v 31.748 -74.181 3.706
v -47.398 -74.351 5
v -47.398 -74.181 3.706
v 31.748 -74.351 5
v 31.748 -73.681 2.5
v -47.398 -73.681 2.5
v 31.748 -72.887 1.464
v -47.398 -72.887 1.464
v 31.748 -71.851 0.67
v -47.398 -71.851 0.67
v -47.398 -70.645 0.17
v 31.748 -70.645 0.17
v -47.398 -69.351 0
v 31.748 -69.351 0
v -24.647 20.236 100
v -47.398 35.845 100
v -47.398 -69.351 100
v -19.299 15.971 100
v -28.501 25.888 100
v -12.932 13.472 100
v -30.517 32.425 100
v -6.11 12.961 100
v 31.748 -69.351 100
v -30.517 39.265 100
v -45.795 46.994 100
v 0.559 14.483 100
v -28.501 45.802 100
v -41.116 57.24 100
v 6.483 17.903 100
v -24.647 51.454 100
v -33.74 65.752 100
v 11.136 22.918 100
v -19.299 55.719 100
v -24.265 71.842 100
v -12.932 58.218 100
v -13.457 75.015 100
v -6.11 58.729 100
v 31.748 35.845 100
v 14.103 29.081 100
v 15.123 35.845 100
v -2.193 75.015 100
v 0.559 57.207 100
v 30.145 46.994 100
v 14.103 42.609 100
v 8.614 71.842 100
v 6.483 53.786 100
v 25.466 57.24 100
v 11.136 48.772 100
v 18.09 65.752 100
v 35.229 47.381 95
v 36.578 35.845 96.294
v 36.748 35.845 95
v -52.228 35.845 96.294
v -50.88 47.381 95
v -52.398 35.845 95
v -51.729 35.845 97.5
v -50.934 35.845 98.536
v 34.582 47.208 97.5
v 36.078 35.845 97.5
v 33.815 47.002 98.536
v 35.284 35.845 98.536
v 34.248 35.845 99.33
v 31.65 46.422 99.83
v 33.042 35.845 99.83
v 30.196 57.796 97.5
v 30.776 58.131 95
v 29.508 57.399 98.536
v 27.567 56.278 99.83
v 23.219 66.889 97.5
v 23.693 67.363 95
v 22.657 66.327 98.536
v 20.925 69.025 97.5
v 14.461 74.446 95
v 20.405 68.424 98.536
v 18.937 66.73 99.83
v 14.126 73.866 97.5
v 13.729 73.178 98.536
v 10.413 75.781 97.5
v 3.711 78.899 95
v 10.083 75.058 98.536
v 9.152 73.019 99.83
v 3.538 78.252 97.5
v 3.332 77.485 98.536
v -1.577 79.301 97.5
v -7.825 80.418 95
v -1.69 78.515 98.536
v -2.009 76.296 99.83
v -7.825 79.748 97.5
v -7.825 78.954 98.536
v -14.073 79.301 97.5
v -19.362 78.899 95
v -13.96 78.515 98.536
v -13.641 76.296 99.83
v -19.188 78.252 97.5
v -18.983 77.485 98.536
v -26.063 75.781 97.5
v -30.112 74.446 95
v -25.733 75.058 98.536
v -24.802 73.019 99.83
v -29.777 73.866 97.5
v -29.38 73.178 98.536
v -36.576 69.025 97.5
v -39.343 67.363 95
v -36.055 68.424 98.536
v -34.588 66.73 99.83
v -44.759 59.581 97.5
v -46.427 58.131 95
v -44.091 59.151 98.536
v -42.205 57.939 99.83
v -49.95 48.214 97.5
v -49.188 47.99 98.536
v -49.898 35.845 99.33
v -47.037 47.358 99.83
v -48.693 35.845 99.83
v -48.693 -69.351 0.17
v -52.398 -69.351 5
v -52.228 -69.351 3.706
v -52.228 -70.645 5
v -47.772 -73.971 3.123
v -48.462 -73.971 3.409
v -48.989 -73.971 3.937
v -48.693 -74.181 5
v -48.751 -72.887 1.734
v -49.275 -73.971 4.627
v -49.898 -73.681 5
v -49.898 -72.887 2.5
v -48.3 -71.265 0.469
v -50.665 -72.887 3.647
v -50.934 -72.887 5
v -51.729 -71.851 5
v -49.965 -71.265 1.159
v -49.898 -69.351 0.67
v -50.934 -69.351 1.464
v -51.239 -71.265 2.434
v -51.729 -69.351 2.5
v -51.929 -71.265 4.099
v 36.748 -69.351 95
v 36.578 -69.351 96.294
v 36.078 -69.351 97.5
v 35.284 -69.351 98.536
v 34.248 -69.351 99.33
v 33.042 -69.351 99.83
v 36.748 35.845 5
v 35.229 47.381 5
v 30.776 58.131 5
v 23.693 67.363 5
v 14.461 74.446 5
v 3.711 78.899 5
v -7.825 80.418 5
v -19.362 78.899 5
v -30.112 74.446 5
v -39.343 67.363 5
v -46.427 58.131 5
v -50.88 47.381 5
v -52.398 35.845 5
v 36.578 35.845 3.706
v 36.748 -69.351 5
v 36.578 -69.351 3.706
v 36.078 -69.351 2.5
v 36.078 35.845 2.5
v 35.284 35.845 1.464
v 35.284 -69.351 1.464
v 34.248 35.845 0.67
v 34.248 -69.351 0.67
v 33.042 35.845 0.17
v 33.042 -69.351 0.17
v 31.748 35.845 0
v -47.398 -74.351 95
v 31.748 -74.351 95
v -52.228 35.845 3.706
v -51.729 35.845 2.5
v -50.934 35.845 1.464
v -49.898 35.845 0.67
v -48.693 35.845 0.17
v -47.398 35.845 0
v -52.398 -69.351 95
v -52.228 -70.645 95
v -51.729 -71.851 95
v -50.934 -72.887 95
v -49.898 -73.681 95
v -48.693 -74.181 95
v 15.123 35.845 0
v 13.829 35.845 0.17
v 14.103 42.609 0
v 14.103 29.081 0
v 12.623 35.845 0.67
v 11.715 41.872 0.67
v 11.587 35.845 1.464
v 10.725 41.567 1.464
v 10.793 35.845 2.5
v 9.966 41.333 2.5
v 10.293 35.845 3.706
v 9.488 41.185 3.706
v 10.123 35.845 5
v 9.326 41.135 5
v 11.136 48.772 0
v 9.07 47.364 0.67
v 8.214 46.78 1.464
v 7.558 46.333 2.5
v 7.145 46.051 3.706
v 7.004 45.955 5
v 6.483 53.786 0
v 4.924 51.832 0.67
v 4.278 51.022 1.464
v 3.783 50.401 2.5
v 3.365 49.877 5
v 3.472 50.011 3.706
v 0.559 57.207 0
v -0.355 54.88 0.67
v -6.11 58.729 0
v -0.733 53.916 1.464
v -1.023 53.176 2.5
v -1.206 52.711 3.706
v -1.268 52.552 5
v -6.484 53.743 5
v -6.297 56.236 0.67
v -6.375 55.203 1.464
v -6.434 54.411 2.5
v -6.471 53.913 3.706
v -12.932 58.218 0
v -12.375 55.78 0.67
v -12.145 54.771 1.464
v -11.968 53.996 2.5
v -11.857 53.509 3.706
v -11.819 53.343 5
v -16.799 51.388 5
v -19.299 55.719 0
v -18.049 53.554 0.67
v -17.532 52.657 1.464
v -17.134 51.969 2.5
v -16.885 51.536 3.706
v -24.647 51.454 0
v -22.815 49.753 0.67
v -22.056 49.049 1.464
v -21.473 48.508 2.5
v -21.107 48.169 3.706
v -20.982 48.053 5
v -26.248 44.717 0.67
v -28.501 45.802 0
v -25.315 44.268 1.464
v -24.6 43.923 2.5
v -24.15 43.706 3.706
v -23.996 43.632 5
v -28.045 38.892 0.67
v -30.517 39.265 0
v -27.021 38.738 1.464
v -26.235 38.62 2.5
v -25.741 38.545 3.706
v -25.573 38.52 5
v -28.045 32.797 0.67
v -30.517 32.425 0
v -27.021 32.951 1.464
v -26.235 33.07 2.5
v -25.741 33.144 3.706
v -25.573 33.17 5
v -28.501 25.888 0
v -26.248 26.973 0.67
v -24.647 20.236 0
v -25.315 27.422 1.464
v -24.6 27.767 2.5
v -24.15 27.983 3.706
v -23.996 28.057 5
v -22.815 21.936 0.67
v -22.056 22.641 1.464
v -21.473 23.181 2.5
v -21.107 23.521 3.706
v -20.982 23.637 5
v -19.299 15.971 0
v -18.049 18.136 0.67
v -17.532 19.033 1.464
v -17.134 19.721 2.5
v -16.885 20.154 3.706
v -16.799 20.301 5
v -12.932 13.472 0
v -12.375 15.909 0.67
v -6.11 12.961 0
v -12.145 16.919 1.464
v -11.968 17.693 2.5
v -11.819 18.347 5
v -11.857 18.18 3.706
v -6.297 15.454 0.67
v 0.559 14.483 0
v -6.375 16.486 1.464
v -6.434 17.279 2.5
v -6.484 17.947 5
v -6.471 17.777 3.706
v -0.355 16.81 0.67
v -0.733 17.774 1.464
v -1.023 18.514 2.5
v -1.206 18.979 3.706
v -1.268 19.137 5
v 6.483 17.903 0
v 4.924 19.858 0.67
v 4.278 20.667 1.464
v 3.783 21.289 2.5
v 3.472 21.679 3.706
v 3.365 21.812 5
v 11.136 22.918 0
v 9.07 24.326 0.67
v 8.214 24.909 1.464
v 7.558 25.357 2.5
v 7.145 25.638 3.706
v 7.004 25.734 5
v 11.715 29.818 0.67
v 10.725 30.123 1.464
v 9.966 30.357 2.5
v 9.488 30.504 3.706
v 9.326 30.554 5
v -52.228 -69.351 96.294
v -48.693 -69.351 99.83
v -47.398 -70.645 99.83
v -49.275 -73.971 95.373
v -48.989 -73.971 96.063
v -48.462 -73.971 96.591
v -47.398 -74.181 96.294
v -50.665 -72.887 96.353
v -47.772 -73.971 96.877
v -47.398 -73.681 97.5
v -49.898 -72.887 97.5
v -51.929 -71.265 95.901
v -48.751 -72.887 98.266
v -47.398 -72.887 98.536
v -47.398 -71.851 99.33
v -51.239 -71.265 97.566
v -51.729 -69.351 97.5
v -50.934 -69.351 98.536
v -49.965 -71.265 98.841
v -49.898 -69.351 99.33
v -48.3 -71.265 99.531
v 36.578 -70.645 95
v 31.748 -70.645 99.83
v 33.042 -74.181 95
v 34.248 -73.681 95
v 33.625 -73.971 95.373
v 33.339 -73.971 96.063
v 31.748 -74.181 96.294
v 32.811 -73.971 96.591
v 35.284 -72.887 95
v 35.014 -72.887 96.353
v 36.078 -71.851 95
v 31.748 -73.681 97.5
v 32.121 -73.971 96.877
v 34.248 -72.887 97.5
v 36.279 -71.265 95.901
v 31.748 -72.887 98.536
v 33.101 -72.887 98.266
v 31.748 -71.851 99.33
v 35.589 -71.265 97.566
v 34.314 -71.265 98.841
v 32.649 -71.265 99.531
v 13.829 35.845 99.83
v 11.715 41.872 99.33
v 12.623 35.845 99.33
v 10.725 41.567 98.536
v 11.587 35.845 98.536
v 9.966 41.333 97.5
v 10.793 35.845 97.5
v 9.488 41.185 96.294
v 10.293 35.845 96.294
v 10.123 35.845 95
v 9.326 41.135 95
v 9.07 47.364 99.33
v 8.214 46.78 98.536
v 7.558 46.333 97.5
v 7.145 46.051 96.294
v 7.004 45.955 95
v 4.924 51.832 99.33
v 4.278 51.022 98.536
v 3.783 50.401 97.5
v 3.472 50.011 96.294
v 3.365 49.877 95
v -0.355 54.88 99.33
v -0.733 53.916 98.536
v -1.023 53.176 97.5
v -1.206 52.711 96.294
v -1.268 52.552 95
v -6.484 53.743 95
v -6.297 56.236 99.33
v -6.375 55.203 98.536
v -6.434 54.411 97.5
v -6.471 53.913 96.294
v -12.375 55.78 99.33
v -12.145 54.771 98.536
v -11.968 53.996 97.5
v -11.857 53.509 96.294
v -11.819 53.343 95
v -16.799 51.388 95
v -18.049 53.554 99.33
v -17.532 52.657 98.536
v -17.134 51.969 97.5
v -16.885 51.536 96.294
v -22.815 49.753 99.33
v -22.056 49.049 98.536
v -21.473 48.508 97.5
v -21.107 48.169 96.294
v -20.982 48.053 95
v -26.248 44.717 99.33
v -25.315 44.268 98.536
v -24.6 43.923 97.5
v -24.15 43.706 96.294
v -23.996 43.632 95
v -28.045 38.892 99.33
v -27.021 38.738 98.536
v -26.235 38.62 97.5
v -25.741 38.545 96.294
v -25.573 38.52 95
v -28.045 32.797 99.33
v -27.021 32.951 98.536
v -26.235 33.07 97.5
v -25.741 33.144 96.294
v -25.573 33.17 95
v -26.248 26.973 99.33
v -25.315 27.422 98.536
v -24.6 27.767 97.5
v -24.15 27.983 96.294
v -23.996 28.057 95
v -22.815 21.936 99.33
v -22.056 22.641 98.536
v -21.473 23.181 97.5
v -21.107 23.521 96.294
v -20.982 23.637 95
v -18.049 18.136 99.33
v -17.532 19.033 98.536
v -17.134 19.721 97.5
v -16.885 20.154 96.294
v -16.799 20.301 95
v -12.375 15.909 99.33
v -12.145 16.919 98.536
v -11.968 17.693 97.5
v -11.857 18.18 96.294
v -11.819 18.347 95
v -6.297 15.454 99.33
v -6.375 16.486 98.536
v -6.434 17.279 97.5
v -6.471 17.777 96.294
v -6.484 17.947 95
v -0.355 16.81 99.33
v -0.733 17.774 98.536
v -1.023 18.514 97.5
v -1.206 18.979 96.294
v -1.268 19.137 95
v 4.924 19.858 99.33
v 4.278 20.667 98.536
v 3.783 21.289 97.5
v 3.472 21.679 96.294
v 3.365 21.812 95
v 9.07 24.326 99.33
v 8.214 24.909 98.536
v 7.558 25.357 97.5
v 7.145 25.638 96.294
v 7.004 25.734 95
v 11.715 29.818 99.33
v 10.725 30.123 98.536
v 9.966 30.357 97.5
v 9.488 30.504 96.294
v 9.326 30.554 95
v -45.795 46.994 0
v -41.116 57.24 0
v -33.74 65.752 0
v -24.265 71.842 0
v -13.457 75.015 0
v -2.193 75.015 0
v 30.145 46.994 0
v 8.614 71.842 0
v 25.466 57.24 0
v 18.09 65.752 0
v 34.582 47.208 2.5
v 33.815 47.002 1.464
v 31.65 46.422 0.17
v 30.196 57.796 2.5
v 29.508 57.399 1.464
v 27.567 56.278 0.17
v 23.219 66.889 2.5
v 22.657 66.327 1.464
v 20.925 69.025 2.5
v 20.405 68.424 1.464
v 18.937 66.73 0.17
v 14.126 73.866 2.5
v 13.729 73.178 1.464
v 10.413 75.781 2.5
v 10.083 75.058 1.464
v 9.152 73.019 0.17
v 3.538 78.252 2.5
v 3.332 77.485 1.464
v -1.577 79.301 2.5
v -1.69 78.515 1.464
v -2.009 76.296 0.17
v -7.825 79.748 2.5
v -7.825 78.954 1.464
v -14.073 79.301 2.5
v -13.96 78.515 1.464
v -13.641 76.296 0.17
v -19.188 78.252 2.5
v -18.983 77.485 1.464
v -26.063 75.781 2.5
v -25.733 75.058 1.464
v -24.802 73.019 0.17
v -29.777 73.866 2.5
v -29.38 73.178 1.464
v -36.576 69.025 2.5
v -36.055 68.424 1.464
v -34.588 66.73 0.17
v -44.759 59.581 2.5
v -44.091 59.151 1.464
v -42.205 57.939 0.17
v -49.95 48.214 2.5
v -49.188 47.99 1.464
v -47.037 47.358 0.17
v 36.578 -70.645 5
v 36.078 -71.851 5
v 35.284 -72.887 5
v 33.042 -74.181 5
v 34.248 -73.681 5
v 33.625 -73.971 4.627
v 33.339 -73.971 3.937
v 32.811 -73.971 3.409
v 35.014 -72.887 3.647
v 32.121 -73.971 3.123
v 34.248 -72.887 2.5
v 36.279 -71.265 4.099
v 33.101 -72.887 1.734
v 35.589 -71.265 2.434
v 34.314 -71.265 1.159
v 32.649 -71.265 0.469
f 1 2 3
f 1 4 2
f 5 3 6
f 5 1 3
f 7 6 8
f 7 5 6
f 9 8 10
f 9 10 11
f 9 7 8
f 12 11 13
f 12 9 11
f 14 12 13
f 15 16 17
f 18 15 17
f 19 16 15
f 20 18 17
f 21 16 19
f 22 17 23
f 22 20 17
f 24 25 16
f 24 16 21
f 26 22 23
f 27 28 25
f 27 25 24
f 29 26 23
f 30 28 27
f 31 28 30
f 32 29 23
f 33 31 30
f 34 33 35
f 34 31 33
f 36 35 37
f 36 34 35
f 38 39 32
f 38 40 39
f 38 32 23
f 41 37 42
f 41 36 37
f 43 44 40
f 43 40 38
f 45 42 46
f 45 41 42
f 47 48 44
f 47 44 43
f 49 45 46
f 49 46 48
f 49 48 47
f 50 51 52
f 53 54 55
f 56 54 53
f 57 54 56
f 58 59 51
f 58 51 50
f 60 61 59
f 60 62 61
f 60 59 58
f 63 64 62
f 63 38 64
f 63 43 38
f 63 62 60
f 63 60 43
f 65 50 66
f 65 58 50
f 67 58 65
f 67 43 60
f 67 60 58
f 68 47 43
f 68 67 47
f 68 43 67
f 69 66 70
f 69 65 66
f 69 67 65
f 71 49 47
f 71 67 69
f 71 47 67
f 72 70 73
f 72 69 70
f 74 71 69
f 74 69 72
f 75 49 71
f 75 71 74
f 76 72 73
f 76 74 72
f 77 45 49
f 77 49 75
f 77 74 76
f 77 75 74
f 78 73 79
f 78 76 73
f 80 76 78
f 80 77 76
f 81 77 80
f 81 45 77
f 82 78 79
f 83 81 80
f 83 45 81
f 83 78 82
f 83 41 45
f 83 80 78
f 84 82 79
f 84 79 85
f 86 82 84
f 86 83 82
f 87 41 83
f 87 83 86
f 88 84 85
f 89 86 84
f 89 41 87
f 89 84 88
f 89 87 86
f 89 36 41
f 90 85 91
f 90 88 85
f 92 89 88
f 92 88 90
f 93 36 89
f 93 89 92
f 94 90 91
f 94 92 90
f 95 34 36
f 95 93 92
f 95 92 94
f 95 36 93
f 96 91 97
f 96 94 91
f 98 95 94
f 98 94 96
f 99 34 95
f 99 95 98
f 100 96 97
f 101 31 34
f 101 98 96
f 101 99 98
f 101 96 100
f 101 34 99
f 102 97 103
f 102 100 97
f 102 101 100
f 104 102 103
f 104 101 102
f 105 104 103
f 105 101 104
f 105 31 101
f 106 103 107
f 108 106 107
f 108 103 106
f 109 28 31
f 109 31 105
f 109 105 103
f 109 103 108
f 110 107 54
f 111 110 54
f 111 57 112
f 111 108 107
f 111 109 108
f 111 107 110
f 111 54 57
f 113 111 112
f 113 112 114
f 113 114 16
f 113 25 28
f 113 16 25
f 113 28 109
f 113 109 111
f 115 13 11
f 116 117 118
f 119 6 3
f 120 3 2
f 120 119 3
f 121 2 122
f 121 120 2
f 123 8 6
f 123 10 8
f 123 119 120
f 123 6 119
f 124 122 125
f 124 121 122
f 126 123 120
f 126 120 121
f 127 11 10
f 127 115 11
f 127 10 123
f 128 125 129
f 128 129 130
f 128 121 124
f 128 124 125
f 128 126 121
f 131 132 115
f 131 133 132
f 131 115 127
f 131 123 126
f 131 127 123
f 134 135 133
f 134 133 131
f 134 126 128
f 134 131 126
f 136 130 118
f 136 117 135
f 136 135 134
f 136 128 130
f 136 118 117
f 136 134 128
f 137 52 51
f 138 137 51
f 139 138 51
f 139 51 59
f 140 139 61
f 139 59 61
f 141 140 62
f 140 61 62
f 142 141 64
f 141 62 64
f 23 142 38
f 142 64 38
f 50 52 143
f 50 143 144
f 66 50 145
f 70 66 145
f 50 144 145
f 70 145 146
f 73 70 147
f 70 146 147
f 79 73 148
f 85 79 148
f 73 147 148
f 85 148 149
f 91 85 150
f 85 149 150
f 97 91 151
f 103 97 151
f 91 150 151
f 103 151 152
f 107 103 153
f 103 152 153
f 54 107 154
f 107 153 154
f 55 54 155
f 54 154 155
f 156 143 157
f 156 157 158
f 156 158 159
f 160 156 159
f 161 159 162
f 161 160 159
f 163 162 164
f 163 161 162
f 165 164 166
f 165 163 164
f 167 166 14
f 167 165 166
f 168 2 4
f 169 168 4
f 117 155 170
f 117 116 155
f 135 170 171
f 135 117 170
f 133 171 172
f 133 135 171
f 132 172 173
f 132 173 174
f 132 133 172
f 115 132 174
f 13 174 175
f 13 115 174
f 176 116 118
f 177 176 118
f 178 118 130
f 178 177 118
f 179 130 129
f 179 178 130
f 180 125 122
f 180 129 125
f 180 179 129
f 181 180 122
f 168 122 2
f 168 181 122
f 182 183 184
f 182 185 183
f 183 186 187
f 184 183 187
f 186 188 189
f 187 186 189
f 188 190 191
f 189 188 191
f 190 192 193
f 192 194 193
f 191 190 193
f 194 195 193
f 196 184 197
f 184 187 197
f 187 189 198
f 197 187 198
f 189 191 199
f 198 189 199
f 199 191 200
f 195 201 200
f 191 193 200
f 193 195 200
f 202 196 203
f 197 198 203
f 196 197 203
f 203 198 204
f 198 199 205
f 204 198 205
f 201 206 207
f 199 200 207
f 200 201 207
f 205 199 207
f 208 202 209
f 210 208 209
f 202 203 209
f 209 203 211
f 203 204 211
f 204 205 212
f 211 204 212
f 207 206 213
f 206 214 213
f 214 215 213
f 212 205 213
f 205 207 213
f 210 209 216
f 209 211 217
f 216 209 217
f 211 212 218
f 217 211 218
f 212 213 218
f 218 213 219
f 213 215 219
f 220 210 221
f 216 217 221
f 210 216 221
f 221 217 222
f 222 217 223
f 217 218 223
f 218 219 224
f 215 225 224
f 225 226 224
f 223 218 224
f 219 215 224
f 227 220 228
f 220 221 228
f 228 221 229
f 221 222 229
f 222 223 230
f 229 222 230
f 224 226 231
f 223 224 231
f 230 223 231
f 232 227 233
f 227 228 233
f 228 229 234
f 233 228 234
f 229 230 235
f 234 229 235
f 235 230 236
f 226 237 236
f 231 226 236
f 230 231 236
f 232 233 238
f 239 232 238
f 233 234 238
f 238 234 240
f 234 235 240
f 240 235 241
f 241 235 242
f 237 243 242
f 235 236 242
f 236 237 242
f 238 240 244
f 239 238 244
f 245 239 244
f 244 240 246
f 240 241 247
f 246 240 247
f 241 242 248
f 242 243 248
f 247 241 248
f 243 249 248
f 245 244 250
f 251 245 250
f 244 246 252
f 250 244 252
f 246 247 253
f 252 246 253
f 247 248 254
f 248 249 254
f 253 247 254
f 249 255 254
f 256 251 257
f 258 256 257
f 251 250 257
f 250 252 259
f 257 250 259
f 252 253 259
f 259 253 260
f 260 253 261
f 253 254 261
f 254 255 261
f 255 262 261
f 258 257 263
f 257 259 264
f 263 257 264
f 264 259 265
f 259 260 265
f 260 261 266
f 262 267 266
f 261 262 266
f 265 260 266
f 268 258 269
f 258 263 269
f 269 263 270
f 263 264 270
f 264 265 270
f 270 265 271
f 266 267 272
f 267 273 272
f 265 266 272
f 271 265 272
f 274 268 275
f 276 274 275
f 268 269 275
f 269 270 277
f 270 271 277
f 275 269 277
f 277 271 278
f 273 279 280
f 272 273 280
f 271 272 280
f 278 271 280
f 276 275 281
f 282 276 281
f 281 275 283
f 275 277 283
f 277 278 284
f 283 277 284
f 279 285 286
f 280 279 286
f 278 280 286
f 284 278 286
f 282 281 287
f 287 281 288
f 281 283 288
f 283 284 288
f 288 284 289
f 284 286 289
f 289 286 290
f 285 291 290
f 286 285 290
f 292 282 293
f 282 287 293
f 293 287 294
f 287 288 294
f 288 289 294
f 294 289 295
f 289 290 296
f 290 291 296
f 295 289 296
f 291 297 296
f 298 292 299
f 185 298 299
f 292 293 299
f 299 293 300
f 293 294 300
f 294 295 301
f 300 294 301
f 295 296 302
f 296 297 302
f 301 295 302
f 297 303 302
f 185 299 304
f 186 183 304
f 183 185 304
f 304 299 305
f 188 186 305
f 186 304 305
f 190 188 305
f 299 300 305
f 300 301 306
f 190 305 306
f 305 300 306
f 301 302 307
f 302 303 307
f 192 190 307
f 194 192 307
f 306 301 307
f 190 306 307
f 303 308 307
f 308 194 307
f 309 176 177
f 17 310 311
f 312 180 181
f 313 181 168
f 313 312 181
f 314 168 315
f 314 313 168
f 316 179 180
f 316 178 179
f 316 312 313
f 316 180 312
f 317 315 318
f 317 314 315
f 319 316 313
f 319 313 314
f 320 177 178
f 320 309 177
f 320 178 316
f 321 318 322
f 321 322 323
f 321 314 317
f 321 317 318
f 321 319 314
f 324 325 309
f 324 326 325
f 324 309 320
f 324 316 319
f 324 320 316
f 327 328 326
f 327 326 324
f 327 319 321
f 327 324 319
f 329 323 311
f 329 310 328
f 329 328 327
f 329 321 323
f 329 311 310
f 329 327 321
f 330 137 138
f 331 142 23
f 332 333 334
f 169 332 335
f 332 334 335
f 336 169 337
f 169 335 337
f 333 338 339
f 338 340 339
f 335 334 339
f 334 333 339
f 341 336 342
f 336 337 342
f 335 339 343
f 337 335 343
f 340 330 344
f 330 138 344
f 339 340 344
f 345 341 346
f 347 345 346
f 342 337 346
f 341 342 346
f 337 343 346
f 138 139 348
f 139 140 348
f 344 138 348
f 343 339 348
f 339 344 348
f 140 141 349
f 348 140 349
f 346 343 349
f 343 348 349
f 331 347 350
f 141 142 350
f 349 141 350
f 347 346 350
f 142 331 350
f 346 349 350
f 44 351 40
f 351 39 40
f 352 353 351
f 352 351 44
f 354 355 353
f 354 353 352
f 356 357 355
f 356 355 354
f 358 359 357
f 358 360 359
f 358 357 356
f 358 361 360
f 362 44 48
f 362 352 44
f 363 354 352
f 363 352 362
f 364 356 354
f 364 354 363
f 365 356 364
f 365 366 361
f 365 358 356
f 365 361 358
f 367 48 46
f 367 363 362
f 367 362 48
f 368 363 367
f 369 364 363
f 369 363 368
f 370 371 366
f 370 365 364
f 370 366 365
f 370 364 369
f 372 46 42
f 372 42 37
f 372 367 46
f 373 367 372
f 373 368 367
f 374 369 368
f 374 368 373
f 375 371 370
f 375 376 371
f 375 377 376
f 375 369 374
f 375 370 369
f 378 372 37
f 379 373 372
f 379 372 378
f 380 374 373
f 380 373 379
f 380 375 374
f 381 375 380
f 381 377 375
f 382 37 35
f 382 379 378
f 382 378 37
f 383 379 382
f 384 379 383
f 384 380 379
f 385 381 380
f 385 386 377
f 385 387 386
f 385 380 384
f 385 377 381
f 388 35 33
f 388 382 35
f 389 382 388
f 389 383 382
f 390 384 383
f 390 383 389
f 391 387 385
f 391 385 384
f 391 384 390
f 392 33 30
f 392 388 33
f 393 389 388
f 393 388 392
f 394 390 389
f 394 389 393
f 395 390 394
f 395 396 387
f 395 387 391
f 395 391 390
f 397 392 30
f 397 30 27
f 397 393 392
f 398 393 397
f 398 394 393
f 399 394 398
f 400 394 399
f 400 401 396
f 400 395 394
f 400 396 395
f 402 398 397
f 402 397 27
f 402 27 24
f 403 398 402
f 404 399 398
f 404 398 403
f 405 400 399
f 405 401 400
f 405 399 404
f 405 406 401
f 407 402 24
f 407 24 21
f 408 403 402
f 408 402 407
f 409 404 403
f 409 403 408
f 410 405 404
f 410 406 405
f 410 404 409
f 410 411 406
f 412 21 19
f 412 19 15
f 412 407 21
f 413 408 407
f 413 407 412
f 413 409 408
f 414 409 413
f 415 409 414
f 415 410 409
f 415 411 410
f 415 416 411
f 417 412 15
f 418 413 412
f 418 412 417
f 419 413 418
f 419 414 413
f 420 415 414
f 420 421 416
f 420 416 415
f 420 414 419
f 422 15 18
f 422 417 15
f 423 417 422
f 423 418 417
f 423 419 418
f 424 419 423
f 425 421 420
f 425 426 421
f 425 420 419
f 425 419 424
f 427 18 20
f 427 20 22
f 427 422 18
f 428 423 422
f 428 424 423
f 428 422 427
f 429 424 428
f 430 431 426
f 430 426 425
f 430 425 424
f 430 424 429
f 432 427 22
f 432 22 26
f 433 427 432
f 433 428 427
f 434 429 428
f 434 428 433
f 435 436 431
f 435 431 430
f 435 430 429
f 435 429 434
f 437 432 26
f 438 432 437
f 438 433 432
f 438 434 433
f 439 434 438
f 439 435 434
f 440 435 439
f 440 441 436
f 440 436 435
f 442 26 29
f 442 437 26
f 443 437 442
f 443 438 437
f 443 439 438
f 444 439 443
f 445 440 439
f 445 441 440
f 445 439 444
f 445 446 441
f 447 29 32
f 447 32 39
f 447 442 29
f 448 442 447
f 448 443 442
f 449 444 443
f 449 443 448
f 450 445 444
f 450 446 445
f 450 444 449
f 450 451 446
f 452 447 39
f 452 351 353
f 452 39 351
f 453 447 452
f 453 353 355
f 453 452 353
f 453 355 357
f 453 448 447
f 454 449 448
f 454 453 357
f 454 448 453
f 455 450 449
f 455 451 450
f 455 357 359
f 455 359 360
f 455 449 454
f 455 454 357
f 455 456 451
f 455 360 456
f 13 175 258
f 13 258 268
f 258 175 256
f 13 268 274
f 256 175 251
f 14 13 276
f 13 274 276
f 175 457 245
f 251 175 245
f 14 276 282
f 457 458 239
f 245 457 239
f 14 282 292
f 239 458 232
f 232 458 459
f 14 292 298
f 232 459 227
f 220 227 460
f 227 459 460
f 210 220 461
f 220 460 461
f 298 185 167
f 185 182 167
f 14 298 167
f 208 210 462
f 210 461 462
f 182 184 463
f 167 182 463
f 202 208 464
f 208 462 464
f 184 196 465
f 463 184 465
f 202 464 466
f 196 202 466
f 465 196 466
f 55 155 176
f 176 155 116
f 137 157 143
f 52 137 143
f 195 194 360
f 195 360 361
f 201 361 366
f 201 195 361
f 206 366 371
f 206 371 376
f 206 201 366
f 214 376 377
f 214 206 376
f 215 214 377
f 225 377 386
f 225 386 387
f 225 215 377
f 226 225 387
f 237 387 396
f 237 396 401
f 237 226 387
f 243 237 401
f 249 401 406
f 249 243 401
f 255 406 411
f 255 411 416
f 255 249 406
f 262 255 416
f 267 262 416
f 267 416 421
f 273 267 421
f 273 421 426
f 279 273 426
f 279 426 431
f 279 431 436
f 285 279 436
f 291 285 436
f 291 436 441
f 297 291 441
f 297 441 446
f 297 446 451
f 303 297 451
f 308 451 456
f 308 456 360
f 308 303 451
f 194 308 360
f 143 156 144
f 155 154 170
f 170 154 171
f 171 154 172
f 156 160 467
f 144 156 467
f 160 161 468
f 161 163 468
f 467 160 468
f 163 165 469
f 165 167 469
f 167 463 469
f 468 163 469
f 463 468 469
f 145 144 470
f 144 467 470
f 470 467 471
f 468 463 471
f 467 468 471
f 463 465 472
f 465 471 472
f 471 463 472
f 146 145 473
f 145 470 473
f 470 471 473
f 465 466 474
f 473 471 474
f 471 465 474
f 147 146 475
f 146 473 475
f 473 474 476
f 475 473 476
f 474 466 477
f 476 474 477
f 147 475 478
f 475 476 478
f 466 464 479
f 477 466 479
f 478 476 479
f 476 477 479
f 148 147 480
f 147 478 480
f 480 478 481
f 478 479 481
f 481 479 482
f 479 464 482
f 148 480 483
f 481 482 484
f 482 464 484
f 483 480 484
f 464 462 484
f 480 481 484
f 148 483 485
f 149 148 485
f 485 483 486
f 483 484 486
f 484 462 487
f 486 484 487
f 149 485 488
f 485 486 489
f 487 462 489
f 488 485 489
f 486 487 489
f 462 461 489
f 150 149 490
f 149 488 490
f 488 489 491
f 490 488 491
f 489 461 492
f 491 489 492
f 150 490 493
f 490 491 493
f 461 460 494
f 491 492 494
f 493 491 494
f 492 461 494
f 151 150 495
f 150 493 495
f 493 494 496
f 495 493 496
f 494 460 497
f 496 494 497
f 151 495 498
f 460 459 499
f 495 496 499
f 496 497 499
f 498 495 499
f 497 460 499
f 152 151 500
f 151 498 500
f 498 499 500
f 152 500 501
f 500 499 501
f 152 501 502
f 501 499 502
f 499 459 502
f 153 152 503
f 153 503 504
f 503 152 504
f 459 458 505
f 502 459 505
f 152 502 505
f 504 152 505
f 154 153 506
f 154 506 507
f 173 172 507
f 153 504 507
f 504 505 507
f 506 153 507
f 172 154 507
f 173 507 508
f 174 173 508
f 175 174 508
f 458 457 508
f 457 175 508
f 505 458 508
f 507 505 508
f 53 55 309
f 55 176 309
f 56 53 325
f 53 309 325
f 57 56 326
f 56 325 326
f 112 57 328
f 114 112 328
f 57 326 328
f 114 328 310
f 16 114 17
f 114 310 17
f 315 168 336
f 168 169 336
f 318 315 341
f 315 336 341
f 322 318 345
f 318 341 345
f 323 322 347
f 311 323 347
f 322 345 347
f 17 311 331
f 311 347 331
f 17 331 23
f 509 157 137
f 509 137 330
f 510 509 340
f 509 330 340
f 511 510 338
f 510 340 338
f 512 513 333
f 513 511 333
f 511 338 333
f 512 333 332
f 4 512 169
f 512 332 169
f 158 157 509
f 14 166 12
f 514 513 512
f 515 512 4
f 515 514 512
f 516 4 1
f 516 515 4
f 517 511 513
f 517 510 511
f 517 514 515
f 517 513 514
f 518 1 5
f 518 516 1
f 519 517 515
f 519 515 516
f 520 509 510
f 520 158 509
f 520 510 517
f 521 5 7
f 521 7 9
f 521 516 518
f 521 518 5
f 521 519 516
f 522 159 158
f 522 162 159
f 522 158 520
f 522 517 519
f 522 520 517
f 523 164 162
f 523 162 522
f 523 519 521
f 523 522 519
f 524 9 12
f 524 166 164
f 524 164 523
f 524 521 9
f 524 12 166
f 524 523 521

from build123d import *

# Parameters (mm, degrees)
F0_R     = 17.948255
F1_DEPTH = 100
F2_R     = 5
F3_R     = 5


with BuildPart() as f1:
    # F0 (on Top) → F1 (new body)
    with BuildSketch(Plane.XY):
        with BuildLine():
            ThreePointArc((36.747999, 35.844807), (-7.825233, 80.418039), (-52.398466, 35.844807))
            Line((-52.398466, 35.844807), (-52.398466, -74.351192))
            Line((-52.398466, -74.351192), (36.747999, -74.351192))
            Line((36.747999, -74.351192), (36.747999, 35.844807))
        make_face()
        with Locations((-7.825233, 35.844807)):
            Circle(F0_R, mode=Mode.SUBTRACT)
    extrude(amount=F1_DEPTH)

    # F2
    f2_edges = [f1.edges().sort_by_distance(p)[0] for p in [
        (-7.825233, 80.418039, 0),
        (36.747999, -19.253192, 100),
        (-7.825233, 80.418039, 100),
        (36.747999, -74.351192, 50),
        (-52.398466, -19.253192, 100),
        (-52.398466, -19.253192, 0),
        (-7.825233, -74.351192, 0),
        (-52.398466, -74.351192, 50),
        (-7.825233, -74.351192, 100),
        (36.747999, -19.253192, 0),
    ]]
    fillet(f2_edges, radius=F2_R)

    # F3
    f3_edges = [f1.edges().sort_by_distance(p)[0] for p in [
        (-25.773488, 35.844807, 100),
        (-25.773488, 35.844807, 0),
    ]]
    fillet(f3_edges, radius=F3_R)


solid = f1.part
